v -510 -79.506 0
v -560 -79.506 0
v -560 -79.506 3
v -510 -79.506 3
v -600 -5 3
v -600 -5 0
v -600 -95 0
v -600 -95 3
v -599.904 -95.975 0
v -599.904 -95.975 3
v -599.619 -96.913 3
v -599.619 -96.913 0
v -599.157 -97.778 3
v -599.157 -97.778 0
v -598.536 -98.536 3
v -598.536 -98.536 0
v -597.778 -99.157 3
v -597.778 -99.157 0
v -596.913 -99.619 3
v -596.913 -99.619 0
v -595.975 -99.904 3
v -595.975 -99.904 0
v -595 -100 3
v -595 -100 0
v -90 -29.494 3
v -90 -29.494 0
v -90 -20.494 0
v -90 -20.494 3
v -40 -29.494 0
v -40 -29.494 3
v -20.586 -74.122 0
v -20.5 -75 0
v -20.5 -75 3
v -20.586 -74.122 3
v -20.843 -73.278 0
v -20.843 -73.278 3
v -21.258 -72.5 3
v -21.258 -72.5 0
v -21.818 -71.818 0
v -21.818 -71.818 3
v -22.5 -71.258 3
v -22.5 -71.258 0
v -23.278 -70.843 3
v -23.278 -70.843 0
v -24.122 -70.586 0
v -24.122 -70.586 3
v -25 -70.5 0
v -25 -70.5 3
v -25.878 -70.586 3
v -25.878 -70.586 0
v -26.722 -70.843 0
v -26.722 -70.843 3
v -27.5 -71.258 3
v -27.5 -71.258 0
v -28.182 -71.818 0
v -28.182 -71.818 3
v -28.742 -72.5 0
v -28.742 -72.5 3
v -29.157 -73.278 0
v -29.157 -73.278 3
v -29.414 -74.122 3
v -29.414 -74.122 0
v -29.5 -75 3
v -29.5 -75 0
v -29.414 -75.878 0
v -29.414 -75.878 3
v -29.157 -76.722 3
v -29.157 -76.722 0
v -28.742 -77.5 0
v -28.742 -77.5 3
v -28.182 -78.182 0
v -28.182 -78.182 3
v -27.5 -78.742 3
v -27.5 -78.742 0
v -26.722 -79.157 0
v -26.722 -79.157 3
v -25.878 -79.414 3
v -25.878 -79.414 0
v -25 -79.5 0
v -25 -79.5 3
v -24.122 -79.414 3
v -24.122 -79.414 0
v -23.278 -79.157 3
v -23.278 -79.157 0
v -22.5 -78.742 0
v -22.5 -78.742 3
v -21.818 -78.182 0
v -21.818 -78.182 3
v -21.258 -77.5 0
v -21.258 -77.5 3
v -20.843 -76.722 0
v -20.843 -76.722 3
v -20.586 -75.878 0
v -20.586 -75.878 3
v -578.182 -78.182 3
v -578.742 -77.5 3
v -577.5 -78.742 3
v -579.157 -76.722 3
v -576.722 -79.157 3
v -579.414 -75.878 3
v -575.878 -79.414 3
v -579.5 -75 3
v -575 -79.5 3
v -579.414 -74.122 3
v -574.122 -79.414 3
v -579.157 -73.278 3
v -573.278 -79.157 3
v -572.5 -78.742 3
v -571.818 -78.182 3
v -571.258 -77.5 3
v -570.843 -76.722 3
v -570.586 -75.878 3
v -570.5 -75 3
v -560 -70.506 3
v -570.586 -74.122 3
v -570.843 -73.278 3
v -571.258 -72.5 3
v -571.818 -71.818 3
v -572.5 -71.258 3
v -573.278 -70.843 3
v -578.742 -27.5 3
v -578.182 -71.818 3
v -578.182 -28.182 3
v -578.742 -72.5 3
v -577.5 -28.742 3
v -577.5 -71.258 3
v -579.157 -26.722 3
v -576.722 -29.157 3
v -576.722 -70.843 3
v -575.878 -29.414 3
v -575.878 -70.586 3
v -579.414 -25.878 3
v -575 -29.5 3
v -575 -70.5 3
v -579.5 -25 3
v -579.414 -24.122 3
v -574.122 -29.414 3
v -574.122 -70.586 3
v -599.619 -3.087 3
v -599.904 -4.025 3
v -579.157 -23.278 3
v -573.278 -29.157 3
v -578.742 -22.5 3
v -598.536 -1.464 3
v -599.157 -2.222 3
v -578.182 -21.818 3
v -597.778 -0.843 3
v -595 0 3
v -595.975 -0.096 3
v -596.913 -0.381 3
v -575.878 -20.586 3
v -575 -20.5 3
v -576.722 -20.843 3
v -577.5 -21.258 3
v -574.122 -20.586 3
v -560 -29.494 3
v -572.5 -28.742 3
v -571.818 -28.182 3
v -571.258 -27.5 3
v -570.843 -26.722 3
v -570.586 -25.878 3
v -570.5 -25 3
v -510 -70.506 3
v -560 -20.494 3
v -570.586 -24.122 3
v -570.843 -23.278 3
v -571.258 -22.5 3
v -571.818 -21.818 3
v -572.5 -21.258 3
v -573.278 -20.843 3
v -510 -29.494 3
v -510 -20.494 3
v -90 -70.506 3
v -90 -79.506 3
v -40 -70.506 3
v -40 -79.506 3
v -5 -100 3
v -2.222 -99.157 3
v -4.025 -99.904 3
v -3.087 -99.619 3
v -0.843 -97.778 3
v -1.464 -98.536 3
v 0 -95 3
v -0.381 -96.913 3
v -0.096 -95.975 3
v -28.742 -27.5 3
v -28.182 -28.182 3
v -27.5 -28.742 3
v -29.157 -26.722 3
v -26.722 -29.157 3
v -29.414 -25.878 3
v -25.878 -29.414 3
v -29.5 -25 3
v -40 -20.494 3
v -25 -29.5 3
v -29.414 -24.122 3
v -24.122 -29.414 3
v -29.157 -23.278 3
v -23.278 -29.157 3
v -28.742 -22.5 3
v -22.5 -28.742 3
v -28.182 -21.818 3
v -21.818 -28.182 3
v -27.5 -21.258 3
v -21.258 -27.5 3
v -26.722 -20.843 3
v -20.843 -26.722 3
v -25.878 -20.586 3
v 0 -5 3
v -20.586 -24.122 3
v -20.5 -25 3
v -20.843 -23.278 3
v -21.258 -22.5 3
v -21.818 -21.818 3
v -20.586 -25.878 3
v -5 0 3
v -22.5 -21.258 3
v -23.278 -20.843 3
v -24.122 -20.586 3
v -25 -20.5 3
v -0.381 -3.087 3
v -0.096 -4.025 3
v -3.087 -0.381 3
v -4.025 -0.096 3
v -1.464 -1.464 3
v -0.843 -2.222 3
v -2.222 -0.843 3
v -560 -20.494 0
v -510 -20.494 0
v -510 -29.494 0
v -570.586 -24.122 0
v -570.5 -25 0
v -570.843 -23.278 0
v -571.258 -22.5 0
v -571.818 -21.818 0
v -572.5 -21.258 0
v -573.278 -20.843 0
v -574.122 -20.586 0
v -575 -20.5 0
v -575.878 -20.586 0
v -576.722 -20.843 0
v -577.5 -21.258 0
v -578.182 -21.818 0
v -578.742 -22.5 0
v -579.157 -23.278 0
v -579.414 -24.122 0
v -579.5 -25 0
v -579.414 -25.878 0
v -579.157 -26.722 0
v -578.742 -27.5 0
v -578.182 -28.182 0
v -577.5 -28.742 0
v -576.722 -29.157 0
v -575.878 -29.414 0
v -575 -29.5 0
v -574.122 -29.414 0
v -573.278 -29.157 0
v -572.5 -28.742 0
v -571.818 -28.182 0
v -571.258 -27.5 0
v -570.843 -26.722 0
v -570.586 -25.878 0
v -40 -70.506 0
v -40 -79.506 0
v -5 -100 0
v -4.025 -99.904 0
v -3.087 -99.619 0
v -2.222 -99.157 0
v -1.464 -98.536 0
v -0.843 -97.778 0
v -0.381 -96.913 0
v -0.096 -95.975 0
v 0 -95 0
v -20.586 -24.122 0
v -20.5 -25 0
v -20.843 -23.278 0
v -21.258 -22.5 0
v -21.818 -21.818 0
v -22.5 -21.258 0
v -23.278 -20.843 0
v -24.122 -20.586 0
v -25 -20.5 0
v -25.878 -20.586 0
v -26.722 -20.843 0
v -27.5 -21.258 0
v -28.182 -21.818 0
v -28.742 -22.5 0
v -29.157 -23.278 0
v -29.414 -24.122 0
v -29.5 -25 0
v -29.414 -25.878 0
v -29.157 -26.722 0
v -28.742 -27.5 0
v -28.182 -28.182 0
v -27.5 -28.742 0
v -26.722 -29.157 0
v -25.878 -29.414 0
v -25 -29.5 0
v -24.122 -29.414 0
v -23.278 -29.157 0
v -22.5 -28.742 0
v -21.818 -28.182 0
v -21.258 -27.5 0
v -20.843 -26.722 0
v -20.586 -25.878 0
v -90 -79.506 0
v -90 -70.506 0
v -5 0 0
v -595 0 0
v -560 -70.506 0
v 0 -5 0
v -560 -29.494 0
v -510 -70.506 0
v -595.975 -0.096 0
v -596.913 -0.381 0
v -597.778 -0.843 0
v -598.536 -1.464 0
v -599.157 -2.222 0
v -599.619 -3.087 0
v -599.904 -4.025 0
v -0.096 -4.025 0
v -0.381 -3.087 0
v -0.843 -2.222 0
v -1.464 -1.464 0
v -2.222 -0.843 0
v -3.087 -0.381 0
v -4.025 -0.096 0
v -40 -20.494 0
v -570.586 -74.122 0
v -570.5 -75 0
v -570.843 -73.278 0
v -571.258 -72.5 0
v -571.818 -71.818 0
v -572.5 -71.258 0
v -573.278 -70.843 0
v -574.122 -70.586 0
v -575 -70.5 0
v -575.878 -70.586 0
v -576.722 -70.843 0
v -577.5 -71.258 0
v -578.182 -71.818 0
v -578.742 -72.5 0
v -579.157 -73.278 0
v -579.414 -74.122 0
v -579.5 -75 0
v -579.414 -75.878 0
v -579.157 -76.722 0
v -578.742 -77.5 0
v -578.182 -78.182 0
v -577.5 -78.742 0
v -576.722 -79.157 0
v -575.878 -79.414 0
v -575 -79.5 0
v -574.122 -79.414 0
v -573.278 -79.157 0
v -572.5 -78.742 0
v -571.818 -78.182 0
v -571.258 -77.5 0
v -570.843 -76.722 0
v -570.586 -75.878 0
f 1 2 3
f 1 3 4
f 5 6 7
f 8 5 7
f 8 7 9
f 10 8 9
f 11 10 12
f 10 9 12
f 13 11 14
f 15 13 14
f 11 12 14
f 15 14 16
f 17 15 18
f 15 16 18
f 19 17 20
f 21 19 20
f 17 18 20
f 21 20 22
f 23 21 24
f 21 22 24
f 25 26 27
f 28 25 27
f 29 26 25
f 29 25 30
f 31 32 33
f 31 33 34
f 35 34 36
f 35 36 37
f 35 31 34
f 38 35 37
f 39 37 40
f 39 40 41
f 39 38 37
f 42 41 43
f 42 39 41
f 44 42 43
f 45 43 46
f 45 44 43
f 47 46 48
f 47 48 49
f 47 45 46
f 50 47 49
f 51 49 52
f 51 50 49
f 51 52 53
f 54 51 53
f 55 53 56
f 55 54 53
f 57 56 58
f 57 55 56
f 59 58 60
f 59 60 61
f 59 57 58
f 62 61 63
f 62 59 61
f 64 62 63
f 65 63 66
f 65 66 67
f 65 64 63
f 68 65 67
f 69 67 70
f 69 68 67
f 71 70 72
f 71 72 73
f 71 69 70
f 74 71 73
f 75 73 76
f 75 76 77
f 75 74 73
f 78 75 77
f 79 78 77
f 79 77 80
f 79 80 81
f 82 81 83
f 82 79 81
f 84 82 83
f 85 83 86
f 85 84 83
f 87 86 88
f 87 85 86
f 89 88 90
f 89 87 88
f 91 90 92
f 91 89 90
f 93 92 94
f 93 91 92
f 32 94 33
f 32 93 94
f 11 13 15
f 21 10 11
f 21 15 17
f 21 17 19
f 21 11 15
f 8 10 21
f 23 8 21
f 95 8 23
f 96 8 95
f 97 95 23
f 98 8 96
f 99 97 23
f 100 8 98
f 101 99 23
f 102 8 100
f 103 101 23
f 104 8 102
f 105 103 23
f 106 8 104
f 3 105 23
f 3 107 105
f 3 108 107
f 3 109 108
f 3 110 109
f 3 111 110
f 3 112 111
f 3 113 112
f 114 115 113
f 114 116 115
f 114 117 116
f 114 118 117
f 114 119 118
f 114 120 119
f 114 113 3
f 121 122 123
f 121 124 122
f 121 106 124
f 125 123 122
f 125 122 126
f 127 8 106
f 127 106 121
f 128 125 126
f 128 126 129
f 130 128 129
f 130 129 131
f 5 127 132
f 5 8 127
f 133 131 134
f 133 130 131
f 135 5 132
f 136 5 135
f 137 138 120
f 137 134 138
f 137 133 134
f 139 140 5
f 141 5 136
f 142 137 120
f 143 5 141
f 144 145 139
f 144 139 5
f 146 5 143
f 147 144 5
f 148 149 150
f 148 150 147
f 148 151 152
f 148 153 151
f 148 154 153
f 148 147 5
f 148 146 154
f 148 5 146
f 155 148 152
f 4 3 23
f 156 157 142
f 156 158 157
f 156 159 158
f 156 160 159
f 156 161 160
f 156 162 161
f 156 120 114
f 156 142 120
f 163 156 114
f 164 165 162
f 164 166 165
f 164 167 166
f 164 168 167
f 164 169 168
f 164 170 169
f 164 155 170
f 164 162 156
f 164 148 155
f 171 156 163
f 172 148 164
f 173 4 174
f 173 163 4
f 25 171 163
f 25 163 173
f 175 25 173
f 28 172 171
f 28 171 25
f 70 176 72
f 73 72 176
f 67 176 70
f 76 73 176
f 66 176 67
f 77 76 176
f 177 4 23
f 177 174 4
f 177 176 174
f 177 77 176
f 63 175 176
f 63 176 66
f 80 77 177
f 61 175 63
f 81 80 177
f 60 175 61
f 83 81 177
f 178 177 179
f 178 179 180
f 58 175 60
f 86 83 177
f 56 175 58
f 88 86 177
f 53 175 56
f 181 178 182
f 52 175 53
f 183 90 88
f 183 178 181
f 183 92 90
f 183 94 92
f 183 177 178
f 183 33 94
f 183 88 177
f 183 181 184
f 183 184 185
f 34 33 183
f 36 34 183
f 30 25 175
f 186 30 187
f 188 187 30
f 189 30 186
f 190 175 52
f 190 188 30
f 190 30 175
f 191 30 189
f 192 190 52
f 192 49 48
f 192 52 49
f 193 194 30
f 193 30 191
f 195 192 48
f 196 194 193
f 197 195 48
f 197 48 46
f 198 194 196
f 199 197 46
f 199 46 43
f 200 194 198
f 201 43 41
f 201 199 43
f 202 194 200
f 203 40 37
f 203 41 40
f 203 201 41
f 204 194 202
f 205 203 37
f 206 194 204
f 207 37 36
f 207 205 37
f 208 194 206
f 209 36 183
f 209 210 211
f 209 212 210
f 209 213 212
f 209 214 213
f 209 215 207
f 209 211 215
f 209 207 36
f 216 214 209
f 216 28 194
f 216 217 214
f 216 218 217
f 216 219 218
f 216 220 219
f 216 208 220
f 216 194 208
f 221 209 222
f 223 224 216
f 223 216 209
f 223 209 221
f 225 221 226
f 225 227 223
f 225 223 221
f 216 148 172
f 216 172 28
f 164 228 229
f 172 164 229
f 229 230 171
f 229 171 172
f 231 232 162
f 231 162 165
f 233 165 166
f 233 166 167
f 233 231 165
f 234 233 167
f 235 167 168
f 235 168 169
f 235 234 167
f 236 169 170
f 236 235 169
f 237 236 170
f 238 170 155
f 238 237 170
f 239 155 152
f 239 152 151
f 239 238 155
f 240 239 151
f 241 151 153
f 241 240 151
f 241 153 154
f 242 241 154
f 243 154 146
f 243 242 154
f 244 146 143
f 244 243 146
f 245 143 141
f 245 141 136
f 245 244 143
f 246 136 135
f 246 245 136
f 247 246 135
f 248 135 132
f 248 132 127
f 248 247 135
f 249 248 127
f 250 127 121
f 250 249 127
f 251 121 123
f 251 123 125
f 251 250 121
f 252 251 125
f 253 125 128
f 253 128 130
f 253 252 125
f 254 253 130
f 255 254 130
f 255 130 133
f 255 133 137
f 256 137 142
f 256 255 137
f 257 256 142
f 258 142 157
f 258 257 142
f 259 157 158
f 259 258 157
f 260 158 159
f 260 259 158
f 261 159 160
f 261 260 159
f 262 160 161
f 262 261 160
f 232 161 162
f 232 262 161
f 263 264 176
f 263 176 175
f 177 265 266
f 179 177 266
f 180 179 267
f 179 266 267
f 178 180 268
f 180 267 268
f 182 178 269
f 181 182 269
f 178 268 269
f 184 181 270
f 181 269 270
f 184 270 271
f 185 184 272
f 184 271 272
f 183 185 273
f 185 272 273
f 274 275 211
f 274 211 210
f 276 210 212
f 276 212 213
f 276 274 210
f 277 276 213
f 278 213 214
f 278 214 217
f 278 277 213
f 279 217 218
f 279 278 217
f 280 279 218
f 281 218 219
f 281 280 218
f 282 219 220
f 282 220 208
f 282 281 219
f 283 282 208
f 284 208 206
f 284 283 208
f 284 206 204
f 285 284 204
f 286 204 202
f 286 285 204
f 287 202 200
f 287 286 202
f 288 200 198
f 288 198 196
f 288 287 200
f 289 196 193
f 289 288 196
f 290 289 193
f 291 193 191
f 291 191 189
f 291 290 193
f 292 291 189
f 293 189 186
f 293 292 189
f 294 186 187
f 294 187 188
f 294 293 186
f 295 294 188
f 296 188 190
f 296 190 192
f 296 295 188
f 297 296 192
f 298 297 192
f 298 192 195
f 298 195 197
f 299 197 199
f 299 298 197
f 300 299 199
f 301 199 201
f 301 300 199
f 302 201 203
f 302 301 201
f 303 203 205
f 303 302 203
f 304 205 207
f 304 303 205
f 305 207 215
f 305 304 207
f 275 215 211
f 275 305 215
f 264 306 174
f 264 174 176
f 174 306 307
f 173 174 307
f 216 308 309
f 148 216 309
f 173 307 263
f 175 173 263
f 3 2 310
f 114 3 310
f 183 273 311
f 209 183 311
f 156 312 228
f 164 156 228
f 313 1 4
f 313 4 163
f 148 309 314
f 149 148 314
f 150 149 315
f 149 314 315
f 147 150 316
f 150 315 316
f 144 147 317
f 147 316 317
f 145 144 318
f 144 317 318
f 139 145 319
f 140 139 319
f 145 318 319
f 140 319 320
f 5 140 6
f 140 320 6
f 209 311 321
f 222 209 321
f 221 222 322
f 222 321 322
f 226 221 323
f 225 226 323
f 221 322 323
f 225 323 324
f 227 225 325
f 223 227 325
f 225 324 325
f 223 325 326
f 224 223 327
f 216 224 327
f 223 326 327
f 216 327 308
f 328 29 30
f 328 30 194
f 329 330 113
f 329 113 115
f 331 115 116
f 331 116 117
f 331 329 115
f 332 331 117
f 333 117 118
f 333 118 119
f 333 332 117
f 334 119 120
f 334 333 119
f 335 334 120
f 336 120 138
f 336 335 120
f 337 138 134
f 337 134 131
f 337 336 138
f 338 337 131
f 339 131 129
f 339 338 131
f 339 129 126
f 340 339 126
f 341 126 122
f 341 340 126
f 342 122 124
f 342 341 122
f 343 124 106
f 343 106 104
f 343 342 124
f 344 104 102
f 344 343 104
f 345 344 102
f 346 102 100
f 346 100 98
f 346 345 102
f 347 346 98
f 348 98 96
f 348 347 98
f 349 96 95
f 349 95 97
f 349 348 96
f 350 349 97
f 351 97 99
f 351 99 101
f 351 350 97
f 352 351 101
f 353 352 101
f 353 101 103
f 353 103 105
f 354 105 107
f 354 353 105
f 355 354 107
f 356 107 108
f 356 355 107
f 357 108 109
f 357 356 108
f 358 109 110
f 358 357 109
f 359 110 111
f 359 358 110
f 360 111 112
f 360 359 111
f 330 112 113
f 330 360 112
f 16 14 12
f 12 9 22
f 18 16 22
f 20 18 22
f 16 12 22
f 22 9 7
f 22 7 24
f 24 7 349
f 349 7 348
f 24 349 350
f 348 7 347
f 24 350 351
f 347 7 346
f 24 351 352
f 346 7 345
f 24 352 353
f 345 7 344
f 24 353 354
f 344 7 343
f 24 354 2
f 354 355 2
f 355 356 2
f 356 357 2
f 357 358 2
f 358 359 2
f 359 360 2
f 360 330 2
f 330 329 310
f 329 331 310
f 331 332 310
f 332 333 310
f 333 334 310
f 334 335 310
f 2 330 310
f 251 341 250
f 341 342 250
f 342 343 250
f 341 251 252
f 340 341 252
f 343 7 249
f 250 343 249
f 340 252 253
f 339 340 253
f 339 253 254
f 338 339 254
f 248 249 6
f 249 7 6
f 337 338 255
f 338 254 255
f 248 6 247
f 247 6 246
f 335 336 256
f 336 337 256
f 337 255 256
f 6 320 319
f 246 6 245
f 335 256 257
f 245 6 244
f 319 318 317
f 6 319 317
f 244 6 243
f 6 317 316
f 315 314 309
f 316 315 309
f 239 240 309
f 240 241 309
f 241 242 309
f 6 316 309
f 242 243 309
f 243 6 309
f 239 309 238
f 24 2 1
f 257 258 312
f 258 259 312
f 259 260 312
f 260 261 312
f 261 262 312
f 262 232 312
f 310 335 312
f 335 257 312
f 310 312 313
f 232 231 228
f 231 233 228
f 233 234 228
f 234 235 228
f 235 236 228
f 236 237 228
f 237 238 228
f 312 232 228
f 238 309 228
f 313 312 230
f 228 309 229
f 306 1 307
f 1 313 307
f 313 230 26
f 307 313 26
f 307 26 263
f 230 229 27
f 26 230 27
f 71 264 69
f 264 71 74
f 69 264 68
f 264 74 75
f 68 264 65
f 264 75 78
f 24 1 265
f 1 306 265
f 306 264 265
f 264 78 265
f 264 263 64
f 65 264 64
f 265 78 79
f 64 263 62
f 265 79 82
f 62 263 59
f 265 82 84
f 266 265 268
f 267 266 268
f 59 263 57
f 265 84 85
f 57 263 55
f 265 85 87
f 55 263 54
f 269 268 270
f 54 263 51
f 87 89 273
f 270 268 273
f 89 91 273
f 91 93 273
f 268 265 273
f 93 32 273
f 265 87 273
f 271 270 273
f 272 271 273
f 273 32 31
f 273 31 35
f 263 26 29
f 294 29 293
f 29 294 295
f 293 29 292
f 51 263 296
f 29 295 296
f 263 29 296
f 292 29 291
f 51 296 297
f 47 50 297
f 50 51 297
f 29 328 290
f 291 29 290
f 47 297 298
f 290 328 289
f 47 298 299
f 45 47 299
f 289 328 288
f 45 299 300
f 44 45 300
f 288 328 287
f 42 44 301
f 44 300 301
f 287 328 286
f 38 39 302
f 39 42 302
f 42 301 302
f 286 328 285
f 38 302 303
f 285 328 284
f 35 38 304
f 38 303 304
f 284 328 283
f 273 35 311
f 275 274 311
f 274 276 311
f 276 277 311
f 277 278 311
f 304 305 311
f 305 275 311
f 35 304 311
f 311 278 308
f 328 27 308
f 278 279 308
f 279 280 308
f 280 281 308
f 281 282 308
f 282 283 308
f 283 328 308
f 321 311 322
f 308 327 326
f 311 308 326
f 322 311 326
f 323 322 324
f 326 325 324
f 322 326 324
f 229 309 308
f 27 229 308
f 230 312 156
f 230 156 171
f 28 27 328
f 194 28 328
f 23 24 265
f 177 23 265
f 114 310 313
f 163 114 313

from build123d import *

# Parameters (mm, degrees)
F0_W     = 50
F0_H     = 9
F0_R     = 4.5
F1_DEPTH = 3


with BuildPart() as f1:
    # F0 (on Top) → F1 (new body)
    with BuildSketch(Plane.XY):
        with BuildLine():
            ThreePointArc((0, -5), (-1.464466, -1.464466), (-5, 0))
            Line((-5, 0), (-50, 0))
            Line((-50, 0), (-550, 0))
            Line((-550, 0), (-595, 0))
            ThreePointArc((-595, 0), (-598.535534, -1.464466), (-600, -5))
            Line((-600, -5), (-600, -95))
            ThreePointArc((-600, -95), (-598.535534, -98.535534), (-595, -100))
            Line((-595, -100), (-550, -100))
            Line((-550, -100), (-50, -100))
            Line((-50, -100), (-5, -100))
            ThreePointArc((-5, -100), (-1.464466, -98.535534), (0, -95))
            Line((0, -95), (0, -5))
        make_face()
        with Locations((-535, -75.006462)):
            Rectangle(F0_W, F0_H, mode=Mode.SUBTRACT)
        with Locations((-575, -75)):
            Circle(F0_R, mode=Mode.SUBTRACT)
        with Locations((-65, -75.006462)):
            Rectangle(F0_W, F0_H, mode=Mode.SUBTRACT)
        with Locations((-25, -75)):
            Circle(F0_R, mode=Mode.SUBTRACT)
        with Locations((-575, -25)):
            Circle(F0_R, mode=Mode.SUBTRACT)
        with Locations((-535, -24.993538)):
            Rectangle(F0_W, F0_H, mode=Mode.SUBTRACT)
        with Locations((-65, -24.993538)):
            Rectangle(F0_W, F0_H, mode=Mode.SUBTRACT)
        with Locations((-25, -25)):
            Circle(F0_R, mode=Mode.SUBTRACT)
    extrude(amount=F1_DEPTH)


solid = f1.part
